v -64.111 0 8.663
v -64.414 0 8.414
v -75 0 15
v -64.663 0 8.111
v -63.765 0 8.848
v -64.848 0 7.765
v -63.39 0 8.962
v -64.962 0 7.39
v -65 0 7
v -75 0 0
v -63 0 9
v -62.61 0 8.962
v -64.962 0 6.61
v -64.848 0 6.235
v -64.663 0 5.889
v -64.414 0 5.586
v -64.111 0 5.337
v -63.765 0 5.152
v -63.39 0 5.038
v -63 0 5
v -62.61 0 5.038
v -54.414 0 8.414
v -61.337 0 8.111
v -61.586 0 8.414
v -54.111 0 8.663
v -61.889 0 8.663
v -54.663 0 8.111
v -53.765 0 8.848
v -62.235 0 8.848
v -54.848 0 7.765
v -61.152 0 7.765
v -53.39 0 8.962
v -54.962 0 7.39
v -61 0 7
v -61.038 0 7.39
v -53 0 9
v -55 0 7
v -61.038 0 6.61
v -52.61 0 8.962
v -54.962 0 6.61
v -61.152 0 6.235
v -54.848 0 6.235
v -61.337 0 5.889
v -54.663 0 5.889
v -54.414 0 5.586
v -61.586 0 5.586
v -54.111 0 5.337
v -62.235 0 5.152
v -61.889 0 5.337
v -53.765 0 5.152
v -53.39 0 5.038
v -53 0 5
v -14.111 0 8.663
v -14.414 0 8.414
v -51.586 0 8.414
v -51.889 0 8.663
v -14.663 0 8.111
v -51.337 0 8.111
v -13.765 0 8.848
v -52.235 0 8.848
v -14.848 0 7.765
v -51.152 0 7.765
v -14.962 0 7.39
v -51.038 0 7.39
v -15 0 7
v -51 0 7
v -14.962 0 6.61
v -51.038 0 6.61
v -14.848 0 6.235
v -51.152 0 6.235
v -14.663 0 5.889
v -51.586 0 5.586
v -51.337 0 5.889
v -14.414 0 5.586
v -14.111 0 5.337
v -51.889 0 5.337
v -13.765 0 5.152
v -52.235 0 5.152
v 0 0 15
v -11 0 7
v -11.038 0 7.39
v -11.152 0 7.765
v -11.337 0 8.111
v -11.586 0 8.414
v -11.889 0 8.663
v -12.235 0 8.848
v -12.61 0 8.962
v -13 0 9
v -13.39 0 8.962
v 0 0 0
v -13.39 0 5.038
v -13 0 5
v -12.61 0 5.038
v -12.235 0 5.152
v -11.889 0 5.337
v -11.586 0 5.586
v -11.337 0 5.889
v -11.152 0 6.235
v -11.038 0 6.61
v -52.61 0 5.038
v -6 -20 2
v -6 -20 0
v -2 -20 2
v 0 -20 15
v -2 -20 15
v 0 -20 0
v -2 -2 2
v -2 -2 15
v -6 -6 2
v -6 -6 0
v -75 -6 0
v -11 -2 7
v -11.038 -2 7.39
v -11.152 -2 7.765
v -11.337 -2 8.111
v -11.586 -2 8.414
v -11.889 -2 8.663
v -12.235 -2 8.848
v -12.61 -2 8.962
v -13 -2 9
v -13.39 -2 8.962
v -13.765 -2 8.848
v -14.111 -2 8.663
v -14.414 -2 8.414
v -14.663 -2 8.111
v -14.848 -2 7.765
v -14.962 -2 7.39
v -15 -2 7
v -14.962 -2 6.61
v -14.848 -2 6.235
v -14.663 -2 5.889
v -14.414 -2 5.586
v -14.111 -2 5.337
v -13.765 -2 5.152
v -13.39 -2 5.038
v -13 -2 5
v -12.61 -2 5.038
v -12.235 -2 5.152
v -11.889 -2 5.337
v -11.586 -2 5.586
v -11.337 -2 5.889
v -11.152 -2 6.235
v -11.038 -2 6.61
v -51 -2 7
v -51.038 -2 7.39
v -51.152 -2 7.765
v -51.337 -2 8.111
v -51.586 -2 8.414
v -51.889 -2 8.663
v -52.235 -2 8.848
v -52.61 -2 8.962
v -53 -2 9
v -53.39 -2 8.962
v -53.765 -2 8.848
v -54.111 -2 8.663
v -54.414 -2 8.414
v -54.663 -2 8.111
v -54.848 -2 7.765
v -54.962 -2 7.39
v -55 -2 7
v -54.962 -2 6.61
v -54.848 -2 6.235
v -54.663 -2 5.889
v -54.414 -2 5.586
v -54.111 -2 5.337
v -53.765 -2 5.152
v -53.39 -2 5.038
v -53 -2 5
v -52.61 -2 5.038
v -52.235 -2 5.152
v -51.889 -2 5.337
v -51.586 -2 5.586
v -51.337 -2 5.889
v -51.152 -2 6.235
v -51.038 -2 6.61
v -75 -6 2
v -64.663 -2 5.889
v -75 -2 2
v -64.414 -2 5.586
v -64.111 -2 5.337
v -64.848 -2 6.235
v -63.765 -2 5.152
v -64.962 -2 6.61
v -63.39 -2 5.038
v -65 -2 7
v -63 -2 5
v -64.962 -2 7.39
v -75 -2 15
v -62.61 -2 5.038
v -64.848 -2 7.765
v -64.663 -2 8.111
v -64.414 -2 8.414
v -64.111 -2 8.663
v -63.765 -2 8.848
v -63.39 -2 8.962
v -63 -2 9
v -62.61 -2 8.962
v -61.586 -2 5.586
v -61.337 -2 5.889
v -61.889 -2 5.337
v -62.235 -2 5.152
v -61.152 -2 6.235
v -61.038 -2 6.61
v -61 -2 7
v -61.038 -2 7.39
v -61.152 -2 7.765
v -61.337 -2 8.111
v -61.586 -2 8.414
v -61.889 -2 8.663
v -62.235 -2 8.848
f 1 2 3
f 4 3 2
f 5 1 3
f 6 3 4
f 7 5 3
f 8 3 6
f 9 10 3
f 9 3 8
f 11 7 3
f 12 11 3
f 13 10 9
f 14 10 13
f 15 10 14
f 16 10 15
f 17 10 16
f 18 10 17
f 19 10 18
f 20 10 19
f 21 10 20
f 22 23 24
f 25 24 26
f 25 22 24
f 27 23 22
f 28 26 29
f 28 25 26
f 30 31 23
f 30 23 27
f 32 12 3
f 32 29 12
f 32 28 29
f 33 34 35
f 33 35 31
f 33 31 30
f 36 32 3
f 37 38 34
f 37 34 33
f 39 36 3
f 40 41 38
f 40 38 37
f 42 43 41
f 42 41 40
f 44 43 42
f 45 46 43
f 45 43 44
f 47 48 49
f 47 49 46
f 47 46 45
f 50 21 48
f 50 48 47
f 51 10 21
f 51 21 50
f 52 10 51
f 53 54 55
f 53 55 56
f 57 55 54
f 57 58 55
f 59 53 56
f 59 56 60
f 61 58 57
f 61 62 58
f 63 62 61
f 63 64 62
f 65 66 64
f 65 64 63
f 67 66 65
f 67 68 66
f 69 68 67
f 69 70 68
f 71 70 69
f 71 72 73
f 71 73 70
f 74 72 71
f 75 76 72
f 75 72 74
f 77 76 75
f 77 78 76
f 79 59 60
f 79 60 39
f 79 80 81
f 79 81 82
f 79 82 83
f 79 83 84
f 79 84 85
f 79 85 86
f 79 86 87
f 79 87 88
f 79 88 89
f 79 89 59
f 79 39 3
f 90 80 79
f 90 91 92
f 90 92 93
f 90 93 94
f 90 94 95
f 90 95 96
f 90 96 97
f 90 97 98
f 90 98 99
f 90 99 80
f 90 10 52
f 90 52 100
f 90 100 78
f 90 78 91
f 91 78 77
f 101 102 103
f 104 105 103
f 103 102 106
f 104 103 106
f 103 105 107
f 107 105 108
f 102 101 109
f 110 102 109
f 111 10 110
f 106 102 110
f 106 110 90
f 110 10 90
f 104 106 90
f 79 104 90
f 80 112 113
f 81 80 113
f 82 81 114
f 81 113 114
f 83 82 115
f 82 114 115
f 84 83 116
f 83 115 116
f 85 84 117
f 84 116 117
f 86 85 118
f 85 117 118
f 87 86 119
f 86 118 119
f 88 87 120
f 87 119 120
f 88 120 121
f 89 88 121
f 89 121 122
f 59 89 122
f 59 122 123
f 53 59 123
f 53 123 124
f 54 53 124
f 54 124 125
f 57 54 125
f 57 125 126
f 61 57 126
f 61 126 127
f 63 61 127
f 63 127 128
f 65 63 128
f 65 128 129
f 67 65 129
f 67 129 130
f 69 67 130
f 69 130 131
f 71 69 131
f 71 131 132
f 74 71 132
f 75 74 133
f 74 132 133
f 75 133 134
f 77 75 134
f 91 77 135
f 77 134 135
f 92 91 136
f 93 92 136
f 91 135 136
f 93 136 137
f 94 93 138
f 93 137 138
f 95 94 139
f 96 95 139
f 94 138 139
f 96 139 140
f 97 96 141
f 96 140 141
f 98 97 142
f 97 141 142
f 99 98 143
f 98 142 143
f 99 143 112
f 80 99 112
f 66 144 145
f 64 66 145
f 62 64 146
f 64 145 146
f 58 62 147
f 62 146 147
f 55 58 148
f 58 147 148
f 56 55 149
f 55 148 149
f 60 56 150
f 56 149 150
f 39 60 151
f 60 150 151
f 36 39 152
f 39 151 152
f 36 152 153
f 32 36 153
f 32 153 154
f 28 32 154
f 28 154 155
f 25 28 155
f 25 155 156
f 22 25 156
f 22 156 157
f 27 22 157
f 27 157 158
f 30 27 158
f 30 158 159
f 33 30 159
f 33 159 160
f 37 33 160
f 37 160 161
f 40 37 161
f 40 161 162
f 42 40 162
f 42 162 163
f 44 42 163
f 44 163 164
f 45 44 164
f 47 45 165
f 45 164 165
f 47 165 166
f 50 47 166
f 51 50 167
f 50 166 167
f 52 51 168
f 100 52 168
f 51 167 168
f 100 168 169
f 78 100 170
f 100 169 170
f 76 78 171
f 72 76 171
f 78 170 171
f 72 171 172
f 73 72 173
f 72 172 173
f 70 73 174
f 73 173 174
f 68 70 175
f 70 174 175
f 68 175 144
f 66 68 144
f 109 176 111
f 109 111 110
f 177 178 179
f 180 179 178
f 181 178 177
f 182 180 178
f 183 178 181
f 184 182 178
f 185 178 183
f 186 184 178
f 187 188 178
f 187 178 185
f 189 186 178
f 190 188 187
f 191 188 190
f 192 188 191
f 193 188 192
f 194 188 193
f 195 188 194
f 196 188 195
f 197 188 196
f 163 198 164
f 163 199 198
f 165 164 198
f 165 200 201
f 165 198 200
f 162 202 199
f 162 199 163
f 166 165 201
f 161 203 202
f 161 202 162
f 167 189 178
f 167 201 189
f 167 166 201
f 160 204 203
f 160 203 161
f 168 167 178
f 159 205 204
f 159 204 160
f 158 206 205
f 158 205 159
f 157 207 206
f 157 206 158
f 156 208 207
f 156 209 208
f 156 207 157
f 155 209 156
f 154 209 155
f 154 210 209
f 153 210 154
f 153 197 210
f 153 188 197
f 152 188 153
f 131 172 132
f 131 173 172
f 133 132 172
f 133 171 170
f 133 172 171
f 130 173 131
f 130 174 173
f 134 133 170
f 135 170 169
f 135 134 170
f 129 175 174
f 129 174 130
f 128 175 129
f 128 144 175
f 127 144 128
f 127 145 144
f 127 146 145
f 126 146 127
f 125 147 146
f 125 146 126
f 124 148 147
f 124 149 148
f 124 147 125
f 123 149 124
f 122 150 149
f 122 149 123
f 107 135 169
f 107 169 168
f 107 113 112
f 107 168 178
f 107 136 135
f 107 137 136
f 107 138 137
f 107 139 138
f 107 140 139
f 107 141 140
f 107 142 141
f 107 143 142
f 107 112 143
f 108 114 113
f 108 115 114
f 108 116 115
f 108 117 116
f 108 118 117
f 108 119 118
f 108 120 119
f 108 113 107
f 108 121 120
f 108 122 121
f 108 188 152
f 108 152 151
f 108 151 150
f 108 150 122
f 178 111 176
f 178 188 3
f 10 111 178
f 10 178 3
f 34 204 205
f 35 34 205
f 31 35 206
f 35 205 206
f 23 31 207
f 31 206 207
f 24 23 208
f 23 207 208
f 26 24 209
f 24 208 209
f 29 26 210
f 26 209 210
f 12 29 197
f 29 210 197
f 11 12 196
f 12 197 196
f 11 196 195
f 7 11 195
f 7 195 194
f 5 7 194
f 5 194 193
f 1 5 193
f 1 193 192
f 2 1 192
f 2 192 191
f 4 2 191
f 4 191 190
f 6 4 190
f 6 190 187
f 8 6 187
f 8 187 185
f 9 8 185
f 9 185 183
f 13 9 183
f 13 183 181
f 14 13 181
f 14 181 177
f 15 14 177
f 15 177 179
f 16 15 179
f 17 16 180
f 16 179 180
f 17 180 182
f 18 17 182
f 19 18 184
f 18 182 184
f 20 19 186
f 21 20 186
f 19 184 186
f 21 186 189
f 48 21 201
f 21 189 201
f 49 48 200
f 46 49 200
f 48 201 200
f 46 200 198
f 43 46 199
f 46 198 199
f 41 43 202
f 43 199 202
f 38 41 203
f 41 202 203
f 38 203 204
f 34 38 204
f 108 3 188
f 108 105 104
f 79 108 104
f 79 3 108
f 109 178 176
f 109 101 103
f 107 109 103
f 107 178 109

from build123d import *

# Parameters (mm, degrees)
SKETCH_W        = 75
SKETCH_H        = 20
PAD_DEPTH       = 15
SKETCH001_W     = 83.048119
SKETCH001_H     = 28.364262
POCKET_DEPTH    = 15.001
SKETCH002_W     = 73.99276
SKETCH002_H     = 21.880196
POCKET001_DEPTH = 13
SKETCH003_R     = 2
POCKET002_DEPTH = 5


with BuildPart() as part:
    # Sketch → Pad (new body)
    with BuildSketch(Plane.XY):
        with Locations((-37.5, -10)):
            Rectangle(SKETCH_W, SKETCH_H)
    extrude(amount=PAD_DEPTH)

    # Sketch001 (on Face6 of Pad) → Pocket (cut, through all)
    with BuildSketch(Plane.XY.offset(15)):
        with Locations((-47.524059, -20.182131)):
            Rectangle(SKETCH001_W, SKETCH001_H)
    extrude(amount=-POCKET_DEPTH, mode=Mode.SUBTRACT)

    # Sketch002 (on Face5 of Pocket) → Pocket001 (cut)
    with BuildSketch(Plane.XY.offset(15)):
        with Locations((-38.99638, -12.940098)):
            Rectangle(SKETCH002_W, SKETCH002_H)
    extrude(amount=-POCKET001_DEPTH, mode=Mode.SUBTRACT)

    # Sketch003 (on Face9 of Pocket001) → Pocket002 (cut)
    with BuildSketch(Plane.XZ.offset(2)):
        with Locations((-13, 7)):
            Circle(SKETCH003_R)
        with Locations((-63, 7)):
            Circle(SKETCH003_R)
        with Locations((-53, 7)):
            Circle(SKETCH003_R)
    extrude(amount=-POCKET002_DEPTH, mode=Mode.SUBTRACT)


solid = part.part
